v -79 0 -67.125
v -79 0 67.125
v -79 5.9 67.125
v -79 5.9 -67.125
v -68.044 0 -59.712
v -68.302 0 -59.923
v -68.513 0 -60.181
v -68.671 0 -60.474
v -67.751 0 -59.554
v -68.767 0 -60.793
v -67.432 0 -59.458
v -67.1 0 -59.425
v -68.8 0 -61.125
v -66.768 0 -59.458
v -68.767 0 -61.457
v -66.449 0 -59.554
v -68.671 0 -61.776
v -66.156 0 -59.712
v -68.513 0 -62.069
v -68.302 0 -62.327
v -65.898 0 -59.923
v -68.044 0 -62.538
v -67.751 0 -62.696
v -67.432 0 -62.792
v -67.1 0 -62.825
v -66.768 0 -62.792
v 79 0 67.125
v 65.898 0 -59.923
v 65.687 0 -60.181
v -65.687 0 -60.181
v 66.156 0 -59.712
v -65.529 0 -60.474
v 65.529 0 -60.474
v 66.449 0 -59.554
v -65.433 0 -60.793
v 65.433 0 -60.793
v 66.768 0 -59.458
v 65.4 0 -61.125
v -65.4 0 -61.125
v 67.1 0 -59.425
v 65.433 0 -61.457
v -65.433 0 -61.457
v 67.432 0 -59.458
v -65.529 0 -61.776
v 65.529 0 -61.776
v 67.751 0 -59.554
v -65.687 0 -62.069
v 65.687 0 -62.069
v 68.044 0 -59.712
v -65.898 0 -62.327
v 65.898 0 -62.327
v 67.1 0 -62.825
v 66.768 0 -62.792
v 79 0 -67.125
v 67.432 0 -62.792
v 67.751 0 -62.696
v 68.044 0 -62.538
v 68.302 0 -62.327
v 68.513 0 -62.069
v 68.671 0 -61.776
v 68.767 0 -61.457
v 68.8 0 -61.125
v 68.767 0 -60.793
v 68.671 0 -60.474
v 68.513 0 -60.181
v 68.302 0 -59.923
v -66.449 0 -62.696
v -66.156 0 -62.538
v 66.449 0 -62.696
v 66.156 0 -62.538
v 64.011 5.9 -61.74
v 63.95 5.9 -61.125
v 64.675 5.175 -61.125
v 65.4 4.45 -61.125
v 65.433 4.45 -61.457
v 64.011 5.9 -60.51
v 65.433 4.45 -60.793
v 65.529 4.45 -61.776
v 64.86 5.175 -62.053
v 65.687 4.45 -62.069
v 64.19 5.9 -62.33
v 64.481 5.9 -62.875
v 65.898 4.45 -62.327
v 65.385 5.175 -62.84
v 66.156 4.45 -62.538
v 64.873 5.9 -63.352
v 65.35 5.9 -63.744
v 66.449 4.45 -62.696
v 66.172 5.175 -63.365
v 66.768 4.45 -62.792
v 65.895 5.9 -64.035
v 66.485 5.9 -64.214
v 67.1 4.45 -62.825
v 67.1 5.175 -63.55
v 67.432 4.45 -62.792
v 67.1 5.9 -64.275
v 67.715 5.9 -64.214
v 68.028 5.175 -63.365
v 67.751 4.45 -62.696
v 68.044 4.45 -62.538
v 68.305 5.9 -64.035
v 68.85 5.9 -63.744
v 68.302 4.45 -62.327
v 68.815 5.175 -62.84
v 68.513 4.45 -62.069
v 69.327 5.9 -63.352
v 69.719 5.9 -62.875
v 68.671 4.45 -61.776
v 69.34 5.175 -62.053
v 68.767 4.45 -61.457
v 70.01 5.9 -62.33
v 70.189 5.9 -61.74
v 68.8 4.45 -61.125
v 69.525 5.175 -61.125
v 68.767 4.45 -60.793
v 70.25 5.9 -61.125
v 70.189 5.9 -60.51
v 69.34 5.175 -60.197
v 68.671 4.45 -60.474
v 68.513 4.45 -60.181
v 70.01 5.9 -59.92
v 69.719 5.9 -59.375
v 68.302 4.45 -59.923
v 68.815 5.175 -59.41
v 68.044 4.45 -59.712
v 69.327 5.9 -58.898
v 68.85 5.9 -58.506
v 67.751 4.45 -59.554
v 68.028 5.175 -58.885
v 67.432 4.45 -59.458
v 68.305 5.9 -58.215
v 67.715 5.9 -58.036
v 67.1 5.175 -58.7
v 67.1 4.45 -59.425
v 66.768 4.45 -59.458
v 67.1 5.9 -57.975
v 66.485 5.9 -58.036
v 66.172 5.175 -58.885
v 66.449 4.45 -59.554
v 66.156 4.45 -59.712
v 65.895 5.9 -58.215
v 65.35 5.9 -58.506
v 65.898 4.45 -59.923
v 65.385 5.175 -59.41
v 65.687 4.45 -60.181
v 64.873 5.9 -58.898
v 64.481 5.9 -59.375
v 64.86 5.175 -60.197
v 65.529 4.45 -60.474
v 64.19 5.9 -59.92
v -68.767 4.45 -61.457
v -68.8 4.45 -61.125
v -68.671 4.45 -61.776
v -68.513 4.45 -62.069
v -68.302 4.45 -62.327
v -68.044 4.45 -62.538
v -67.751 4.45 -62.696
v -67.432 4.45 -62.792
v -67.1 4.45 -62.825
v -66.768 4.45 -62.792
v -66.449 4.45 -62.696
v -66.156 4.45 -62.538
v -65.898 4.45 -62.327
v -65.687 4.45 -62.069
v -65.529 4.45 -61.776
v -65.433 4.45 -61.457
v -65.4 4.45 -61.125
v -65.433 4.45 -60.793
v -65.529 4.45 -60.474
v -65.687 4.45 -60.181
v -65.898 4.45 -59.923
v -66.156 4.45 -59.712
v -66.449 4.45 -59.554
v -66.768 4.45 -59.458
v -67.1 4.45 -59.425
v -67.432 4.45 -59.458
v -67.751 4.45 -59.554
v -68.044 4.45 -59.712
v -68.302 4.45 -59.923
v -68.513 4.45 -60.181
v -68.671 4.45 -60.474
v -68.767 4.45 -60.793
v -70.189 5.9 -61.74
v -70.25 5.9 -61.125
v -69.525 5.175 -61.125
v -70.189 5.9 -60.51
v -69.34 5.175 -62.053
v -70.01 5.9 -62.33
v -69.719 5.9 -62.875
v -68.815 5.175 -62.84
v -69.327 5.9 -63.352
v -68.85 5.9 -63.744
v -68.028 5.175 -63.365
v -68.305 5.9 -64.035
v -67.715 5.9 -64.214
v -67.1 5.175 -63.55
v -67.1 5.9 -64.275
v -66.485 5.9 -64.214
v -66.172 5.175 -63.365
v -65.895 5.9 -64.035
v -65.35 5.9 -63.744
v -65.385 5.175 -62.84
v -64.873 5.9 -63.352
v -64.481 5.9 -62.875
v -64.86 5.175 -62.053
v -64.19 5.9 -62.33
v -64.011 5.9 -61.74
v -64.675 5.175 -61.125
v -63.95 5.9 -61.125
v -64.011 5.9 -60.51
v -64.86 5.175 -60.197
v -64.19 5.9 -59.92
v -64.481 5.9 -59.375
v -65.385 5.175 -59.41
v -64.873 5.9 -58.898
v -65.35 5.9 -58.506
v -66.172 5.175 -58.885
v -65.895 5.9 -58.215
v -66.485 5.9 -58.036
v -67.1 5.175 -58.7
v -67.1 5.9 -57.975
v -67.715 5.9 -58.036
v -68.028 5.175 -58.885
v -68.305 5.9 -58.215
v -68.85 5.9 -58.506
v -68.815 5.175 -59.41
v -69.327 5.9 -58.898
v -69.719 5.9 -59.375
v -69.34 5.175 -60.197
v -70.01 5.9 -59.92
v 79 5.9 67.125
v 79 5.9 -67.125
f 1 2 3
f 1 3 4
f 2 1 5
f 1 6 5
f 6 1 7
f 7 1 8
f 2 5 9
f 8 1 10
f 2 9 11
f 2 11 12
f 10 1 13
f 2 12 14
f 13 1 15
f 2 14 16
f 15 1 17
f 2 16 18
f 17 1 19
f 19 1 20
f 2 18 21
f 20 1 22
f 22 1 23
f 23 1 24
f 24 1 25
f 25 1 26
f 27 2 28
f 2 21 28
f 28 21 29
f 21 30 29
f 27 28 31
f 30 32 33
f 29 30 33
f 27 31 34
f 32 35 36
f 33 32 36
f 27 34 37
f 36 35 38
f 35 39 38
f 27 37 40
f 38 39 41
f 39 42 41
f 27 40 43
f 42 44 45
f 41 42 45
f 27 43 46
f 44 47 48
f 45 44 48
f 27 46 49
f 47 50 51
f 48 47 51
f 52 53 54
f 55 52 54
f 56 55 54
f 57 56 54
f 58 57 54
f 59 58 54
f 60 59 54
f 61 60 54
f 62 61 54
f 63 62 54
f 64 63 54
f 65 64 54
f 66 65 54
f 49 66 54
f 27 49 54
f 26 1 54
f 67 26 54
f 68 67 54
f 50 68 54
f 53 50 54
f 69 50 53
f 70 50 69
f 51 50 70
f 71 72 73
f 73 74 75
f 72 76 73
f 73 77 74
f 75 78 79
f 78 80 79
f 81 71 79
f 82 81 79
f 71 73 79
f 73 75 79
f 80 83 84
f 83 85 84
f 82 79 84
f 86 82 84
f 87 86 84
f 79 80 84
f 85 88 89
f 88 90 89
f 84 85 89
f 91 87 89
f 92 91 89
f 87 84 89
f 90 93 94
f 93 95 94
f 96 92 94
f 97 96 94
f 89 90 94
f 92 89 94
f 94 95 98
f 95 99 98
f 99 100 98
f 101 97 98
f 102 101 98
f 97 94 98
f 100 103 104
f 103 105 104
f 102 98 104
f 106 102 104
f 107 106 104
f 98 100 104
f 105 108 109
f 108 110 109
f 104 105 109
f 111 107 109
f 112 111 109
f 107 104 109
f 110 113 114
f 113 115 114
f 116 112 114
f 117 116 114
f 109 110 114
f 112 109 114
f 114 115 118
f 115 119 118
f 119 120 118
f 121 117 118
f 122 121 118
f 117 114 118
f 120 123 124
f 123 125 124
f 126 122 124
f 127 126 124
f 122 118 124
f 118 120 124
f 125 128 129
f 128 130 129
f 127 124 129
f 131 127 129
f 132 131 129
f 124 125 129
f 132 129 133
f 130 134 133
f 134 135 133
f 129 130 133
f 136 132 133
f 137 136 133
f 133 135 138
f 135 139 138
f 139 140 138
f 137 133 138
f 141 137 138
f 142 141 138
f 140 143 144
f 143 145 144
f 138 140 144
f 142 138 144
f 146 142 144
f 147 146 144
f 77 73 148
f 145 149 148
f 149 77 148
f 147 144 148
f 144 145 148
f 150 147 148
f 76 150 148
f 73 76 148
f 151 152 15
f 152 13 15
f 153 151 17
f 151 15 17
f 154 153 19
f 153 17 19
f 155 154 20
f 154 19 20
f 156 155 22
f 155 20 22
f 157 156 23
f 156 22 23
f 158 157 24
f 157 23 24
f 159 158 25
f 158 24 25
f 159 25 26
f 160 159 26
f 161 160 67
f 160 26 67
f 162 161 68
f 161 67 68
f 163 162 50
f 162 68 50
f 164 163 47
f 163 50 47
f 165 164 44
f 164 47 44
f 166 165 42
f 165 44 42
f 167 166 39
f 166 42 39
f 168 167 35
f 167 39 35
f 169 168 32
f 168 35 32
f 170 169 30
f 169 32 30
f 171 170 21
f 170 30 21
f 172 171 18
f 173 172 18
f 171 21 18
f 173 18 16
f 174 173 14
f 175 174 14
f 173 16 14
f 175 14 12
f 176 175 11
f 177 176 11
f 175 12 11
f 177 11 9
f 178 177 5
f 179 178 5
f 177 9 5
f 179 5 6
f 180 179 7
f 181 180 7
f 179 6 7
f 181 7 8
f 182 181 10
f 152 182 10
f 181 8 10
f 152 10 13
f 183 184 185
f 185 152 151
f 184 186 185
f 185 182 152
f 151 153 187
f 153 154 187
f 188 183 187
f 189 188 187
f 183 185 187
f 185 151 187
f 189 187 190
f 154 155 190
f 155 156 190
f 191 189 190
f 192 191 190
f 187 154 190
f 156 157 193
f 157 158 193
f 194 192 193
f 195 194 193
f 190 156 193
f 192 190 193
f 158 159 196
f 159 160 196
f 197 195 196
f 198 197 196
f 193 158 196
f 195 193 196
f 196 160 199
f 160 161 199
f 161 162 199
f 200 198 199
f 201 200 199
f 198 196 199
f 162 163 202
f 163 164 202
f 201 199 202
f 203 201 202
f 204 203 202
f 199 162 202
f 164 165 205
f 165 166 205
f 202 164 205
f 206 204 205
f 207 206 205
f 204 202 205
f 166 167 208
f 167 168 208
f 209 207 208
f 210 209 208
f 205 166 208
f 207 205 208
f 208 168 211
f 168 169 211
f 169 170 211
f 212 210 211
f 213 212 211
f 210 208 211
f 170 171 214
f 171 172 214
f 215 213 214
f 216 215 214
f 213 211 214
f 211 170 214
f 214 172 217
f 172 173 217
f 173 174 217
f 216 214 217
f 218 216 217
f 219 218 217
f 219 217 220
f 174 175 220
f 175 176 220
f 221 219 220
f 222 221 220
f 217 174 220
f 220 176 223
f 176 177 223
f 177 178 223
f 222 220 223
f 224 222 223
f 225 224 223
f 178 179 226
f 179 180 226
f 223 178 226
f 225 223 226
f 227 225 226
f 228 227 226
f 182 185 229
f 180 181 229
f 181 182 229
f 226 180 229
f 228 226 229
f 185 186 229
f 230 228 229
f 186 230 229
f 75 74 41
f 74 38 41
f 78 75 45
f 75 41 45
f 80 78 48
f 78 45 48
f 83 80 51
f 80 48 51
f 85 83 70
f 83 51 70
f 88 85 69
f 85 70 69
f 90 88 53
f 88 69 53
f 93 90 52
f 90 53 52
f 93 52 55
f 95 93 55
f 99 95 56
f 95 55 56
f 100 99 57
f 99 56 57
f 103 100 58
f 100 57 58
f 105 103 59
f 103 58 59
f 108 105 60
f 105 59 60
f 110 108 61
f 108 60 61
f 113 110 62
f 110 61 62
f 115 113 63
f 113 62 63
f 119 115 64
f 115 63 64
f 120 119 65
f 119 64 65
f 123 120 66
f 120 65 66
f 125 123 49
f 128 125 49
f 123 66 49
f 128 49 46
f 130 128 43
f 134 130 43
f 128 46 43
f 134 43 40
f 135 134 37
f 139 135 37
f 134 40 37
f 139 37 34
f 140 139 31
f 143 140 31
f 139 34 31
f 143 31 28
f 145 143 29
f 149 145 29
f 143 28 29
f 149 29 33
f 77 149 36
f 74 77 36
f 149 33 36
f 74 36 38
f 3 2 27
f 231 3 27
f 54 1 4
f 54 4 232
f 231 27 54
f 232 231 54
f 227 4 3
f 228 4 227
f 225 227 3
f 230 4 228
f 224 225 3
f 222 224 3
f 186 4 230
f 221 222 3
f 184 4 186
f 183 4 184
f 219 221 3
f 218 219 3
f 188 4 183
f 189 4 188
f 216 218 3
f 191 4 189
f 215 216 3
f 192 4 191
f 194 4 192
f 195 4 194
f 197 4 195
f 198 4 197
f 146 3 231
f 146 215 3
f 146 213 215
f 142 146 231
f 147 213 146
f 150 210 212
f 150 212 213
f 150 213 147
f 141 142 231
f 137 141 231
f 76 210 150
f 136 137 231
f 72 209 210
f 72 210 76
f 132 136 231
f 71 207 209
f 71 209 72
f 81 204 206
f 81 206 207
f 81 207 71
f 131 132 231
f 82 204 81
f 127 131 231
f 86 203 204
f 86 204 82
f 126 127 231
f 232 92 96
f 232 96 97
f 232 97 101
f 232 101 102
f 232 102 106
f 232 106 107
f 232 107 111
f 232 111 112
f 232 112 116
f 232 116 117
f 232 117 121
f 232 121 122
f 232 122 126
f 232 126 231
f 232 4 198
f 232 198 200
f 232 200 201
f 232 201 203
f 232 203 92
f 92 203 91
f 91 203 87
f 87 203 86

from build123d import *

# Parameters (mm, degrees)
SKETCH1_W                                       = 158
SKETCH1_H                                       = 134.25
BOSS_EXTRUDE1_DEPTH                             = 5.9
CSK_FOR_M3_FLAT_HEAD_MACHINE_SCREW1_D           = 3.4
CSK_FOR_M3_FLAT_HEAD_MACHINE_SCREW1_DEPTH       = 10
CSK_FOR_M3_FLAT_HEAD_MACHINE_SCREW1_CSINK_D     = 6.3
CSK_FOR_M3_FLAT_HEAD_MACHINE_SCREW1_CSINK_ANGLE = 90
CSK_FOR_M3_FLAT_HEAD_MACHINE_SCREW1_TIP         = 1.021463052


with BuildPart() as part:
    # Sketch1 → Boss-Extrude1 (new body)
    with BuildSketch(Plane(origin=(0, 0, 0), x_dir=(1, 0, 0), z_dir=(0, 1, 0))):
        Rectangle(SKETCH1_W, SKETCH1_H)
    extrude(amount=BOSS_EXTRUDE1_DEPTH)

    # CSK for M3 Flat Head Machine Screw1
    with Locations(Plane(origin=(0, 5.9, 0), x_dir=(1, 0, 0), z_dir=(0, 1, 0))):
        with Locations((-67.1, 61.125), (67.1, 61.125)):
            CounterSinkHole(CSK_FOR_M3_FLAT_HEAD_MACHINE_SCREW1_D / 2, CSK_FOR_M3_FLAT_HEAD_MACHINE_SCREW1_CSINK_D / 2, depth=CSK_FOR_M3_FLAT_HEAD_MACHINE_SCREW1_DEPTH, counter_sink_angle=CSK_FOR_M3_FLAT_HEAD_MACHINE_SCREW1_CSINK_ANGLE)
            with Locations((0, 0, -(CSK_FOR_M3_FLAT_HEAD_MACHINE_SCREW1_DEPTH + CSK_FOR_M3_FLAT_HEAD_MACHINE_SCREW1_TIP / 2))):  # 118° drill point
                Cone(0, CSK_FOR_M3_FLAT_HEAD_MACHINE_SCREW1_D / 2, CSK_FOR_M3_FLAT_HEAD_MACHINE_SCREW1_TIP, mode=Mode.SUBTRACT)


solid = part.part
